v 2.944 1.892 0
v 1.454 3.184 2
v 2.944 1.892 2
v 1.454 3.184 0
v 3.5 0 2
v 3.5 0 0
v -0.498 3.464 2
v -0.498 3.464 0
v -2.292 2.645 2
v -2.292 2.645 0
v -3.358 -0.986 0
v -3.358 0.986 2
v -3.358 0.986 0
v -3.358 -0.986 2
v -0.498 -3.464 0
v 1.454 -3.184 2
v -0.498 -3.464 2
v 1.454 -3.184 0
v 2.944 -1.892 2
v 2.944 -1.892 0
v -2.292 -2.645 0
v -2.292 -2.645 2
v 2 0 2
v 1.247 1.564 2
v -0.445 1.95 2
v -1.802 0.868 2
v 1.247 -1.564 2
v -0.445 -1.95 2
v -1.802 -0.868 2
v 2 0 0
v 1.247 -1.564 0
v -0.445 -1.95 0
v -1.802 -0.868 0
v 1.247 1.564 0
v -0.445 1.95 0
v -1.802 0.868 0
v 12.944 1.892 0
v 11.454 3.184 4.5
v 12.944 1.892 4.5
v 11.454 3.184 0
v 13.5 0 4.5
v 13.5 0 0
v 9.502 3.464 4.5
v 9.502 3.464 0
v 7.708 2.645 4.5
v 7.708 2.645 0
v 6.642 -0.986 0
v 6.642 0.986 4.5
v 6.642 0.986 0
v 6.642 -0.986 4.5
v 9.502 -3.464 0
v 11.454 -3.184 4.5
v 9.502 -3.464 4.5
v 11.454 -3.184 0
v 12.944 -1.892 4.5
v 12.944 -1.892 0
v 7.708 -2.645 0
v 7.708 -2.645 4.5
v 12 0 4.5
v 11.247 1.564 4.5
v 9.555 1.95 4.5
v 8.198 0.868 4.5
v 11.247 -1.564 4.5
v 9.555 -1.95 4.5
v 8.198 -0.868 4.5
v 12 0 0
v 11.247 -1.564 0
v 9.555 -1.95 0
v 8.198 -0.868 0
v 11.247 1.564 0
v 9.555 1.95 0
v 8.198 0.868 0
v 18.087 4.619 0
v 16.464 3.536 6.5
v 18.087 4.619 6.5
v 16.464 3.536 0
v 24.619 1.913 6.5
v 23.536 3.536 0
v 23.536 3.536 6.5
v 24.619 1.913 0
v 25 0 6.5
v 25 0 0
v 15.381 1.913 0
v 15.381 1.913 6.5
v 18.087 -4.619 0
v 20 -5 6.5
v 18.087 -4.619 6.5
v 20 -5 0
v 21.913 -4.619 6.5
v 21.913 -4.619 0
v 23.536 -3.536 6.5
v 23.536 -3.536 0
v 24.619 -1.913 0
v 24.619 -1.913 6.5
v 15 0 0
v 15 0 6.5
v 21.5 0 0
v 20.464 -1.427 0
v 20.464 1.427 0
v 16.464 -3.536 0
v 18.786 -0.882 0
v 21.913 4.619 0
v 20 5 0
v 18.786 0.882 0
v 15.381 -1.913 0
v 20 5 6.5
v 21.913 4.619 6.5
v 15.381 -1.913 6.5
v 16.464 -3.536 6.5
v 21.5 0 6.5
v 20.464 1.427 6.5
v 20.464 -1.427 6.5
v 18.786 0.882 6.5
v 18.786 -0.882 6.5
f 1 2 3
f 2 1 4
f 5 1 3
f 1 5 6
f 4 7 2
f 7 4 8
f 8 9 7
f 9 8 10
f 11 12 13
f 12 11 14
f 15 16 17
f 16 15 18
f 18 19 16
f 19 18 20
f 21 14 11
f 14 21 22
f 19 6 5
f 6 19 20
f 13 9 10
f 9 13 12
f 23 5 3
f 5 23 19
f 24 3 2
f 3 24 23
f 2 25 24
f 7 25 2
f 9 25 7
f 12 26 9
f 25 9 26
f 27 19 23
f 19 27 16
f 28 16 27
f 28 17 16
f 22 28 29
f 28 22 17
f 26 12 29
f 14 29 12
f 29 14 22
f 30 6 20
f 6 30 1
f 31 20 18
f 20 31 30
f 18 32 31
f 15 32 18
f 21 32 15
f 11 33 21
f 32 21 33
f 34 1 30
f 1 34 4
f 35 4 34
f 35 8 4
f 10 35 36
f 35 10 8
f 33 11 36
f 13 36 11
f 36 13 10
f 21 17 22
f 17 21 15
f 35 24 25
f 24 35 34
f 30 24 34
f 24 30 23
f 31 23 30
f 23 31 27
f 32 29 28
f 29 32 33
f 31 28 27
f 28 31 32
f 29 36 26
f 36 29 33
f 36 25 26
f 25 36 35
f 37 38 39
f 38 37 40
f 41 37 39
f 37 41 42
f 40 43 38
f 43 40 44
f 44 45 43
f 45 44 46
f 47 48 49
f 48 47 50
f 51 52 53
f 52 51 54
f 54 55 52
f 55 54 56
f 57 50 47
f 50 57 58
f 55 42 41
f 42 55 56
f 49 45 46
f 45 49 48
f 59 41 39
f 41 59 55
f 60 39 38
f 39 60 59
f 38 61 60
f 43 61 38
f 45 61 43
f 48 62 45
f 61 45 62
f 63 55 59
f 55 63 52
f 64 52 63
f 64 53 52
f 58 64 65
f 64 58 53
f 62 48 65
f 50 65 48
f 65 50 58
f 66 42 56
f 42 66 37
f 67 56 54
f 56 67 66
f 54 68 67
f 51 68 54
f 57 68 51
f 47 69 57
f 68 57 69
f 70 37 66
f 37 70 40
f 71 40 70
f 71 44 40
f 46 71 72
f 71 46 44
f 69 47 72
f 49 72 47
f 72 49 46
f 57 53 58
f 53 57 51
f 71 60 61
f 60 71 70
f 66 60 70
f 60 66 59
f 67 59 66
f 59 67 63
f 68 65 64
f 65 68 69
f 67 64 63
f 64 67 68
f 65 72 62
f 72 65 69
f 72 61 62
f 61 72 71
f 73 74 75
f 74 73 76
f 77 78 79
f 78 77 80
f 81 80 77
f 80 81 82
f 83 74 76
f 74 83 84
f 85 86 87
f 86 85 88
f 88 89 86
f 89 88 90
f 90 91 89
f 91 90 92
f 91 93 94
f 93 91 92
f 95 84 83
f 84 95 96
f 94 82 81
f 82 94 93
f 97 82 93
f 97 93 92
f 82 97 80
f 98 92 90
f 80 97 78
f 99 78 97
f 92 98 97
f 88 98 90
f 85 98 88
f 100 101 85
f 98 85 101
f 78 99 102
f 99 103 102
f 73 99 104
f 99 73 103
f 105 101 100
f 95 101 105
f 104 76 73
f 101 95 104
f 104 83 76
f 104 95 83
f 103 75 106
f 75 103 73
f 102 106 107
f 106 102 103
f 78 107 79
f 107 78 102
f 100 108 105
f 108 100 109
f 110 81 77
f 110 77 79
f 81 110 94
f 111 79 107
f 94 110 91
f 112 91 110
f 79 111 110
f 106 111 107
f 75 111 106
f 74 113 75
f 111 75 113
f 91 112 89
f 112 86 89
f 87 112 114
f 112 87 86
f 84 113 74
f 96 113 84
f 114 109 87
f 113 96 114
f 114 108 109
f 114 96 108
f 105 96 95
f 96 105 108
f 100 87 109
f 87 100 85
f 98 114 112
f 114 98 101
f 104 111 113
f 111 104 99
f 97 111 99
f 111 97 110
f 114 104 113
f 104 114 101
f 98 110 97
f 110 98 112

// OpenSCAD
pulleyholeradius=4.0/2;
mountholeradius=3.0/2;

or = 7.0/2;

difference()
{
   cylinder(r = or, h = 2);
   translate([0, 0, -1]) cylinder(r = pulleyholeradius, h = 4);
}

translate([10, 0, 0])
difference()
{
   cylinder(r = or, h = 4.5);
   translate([0, 0, -1]) cylinder(r = pulleyholeradius, h = 6);
}

translate([20, 0, 0])
difference()
{
   cylinder(r = 5, h = 6.5);
   translate([0, 0, -1]) cylinder(r = mountholeradius, h = 8);
}
